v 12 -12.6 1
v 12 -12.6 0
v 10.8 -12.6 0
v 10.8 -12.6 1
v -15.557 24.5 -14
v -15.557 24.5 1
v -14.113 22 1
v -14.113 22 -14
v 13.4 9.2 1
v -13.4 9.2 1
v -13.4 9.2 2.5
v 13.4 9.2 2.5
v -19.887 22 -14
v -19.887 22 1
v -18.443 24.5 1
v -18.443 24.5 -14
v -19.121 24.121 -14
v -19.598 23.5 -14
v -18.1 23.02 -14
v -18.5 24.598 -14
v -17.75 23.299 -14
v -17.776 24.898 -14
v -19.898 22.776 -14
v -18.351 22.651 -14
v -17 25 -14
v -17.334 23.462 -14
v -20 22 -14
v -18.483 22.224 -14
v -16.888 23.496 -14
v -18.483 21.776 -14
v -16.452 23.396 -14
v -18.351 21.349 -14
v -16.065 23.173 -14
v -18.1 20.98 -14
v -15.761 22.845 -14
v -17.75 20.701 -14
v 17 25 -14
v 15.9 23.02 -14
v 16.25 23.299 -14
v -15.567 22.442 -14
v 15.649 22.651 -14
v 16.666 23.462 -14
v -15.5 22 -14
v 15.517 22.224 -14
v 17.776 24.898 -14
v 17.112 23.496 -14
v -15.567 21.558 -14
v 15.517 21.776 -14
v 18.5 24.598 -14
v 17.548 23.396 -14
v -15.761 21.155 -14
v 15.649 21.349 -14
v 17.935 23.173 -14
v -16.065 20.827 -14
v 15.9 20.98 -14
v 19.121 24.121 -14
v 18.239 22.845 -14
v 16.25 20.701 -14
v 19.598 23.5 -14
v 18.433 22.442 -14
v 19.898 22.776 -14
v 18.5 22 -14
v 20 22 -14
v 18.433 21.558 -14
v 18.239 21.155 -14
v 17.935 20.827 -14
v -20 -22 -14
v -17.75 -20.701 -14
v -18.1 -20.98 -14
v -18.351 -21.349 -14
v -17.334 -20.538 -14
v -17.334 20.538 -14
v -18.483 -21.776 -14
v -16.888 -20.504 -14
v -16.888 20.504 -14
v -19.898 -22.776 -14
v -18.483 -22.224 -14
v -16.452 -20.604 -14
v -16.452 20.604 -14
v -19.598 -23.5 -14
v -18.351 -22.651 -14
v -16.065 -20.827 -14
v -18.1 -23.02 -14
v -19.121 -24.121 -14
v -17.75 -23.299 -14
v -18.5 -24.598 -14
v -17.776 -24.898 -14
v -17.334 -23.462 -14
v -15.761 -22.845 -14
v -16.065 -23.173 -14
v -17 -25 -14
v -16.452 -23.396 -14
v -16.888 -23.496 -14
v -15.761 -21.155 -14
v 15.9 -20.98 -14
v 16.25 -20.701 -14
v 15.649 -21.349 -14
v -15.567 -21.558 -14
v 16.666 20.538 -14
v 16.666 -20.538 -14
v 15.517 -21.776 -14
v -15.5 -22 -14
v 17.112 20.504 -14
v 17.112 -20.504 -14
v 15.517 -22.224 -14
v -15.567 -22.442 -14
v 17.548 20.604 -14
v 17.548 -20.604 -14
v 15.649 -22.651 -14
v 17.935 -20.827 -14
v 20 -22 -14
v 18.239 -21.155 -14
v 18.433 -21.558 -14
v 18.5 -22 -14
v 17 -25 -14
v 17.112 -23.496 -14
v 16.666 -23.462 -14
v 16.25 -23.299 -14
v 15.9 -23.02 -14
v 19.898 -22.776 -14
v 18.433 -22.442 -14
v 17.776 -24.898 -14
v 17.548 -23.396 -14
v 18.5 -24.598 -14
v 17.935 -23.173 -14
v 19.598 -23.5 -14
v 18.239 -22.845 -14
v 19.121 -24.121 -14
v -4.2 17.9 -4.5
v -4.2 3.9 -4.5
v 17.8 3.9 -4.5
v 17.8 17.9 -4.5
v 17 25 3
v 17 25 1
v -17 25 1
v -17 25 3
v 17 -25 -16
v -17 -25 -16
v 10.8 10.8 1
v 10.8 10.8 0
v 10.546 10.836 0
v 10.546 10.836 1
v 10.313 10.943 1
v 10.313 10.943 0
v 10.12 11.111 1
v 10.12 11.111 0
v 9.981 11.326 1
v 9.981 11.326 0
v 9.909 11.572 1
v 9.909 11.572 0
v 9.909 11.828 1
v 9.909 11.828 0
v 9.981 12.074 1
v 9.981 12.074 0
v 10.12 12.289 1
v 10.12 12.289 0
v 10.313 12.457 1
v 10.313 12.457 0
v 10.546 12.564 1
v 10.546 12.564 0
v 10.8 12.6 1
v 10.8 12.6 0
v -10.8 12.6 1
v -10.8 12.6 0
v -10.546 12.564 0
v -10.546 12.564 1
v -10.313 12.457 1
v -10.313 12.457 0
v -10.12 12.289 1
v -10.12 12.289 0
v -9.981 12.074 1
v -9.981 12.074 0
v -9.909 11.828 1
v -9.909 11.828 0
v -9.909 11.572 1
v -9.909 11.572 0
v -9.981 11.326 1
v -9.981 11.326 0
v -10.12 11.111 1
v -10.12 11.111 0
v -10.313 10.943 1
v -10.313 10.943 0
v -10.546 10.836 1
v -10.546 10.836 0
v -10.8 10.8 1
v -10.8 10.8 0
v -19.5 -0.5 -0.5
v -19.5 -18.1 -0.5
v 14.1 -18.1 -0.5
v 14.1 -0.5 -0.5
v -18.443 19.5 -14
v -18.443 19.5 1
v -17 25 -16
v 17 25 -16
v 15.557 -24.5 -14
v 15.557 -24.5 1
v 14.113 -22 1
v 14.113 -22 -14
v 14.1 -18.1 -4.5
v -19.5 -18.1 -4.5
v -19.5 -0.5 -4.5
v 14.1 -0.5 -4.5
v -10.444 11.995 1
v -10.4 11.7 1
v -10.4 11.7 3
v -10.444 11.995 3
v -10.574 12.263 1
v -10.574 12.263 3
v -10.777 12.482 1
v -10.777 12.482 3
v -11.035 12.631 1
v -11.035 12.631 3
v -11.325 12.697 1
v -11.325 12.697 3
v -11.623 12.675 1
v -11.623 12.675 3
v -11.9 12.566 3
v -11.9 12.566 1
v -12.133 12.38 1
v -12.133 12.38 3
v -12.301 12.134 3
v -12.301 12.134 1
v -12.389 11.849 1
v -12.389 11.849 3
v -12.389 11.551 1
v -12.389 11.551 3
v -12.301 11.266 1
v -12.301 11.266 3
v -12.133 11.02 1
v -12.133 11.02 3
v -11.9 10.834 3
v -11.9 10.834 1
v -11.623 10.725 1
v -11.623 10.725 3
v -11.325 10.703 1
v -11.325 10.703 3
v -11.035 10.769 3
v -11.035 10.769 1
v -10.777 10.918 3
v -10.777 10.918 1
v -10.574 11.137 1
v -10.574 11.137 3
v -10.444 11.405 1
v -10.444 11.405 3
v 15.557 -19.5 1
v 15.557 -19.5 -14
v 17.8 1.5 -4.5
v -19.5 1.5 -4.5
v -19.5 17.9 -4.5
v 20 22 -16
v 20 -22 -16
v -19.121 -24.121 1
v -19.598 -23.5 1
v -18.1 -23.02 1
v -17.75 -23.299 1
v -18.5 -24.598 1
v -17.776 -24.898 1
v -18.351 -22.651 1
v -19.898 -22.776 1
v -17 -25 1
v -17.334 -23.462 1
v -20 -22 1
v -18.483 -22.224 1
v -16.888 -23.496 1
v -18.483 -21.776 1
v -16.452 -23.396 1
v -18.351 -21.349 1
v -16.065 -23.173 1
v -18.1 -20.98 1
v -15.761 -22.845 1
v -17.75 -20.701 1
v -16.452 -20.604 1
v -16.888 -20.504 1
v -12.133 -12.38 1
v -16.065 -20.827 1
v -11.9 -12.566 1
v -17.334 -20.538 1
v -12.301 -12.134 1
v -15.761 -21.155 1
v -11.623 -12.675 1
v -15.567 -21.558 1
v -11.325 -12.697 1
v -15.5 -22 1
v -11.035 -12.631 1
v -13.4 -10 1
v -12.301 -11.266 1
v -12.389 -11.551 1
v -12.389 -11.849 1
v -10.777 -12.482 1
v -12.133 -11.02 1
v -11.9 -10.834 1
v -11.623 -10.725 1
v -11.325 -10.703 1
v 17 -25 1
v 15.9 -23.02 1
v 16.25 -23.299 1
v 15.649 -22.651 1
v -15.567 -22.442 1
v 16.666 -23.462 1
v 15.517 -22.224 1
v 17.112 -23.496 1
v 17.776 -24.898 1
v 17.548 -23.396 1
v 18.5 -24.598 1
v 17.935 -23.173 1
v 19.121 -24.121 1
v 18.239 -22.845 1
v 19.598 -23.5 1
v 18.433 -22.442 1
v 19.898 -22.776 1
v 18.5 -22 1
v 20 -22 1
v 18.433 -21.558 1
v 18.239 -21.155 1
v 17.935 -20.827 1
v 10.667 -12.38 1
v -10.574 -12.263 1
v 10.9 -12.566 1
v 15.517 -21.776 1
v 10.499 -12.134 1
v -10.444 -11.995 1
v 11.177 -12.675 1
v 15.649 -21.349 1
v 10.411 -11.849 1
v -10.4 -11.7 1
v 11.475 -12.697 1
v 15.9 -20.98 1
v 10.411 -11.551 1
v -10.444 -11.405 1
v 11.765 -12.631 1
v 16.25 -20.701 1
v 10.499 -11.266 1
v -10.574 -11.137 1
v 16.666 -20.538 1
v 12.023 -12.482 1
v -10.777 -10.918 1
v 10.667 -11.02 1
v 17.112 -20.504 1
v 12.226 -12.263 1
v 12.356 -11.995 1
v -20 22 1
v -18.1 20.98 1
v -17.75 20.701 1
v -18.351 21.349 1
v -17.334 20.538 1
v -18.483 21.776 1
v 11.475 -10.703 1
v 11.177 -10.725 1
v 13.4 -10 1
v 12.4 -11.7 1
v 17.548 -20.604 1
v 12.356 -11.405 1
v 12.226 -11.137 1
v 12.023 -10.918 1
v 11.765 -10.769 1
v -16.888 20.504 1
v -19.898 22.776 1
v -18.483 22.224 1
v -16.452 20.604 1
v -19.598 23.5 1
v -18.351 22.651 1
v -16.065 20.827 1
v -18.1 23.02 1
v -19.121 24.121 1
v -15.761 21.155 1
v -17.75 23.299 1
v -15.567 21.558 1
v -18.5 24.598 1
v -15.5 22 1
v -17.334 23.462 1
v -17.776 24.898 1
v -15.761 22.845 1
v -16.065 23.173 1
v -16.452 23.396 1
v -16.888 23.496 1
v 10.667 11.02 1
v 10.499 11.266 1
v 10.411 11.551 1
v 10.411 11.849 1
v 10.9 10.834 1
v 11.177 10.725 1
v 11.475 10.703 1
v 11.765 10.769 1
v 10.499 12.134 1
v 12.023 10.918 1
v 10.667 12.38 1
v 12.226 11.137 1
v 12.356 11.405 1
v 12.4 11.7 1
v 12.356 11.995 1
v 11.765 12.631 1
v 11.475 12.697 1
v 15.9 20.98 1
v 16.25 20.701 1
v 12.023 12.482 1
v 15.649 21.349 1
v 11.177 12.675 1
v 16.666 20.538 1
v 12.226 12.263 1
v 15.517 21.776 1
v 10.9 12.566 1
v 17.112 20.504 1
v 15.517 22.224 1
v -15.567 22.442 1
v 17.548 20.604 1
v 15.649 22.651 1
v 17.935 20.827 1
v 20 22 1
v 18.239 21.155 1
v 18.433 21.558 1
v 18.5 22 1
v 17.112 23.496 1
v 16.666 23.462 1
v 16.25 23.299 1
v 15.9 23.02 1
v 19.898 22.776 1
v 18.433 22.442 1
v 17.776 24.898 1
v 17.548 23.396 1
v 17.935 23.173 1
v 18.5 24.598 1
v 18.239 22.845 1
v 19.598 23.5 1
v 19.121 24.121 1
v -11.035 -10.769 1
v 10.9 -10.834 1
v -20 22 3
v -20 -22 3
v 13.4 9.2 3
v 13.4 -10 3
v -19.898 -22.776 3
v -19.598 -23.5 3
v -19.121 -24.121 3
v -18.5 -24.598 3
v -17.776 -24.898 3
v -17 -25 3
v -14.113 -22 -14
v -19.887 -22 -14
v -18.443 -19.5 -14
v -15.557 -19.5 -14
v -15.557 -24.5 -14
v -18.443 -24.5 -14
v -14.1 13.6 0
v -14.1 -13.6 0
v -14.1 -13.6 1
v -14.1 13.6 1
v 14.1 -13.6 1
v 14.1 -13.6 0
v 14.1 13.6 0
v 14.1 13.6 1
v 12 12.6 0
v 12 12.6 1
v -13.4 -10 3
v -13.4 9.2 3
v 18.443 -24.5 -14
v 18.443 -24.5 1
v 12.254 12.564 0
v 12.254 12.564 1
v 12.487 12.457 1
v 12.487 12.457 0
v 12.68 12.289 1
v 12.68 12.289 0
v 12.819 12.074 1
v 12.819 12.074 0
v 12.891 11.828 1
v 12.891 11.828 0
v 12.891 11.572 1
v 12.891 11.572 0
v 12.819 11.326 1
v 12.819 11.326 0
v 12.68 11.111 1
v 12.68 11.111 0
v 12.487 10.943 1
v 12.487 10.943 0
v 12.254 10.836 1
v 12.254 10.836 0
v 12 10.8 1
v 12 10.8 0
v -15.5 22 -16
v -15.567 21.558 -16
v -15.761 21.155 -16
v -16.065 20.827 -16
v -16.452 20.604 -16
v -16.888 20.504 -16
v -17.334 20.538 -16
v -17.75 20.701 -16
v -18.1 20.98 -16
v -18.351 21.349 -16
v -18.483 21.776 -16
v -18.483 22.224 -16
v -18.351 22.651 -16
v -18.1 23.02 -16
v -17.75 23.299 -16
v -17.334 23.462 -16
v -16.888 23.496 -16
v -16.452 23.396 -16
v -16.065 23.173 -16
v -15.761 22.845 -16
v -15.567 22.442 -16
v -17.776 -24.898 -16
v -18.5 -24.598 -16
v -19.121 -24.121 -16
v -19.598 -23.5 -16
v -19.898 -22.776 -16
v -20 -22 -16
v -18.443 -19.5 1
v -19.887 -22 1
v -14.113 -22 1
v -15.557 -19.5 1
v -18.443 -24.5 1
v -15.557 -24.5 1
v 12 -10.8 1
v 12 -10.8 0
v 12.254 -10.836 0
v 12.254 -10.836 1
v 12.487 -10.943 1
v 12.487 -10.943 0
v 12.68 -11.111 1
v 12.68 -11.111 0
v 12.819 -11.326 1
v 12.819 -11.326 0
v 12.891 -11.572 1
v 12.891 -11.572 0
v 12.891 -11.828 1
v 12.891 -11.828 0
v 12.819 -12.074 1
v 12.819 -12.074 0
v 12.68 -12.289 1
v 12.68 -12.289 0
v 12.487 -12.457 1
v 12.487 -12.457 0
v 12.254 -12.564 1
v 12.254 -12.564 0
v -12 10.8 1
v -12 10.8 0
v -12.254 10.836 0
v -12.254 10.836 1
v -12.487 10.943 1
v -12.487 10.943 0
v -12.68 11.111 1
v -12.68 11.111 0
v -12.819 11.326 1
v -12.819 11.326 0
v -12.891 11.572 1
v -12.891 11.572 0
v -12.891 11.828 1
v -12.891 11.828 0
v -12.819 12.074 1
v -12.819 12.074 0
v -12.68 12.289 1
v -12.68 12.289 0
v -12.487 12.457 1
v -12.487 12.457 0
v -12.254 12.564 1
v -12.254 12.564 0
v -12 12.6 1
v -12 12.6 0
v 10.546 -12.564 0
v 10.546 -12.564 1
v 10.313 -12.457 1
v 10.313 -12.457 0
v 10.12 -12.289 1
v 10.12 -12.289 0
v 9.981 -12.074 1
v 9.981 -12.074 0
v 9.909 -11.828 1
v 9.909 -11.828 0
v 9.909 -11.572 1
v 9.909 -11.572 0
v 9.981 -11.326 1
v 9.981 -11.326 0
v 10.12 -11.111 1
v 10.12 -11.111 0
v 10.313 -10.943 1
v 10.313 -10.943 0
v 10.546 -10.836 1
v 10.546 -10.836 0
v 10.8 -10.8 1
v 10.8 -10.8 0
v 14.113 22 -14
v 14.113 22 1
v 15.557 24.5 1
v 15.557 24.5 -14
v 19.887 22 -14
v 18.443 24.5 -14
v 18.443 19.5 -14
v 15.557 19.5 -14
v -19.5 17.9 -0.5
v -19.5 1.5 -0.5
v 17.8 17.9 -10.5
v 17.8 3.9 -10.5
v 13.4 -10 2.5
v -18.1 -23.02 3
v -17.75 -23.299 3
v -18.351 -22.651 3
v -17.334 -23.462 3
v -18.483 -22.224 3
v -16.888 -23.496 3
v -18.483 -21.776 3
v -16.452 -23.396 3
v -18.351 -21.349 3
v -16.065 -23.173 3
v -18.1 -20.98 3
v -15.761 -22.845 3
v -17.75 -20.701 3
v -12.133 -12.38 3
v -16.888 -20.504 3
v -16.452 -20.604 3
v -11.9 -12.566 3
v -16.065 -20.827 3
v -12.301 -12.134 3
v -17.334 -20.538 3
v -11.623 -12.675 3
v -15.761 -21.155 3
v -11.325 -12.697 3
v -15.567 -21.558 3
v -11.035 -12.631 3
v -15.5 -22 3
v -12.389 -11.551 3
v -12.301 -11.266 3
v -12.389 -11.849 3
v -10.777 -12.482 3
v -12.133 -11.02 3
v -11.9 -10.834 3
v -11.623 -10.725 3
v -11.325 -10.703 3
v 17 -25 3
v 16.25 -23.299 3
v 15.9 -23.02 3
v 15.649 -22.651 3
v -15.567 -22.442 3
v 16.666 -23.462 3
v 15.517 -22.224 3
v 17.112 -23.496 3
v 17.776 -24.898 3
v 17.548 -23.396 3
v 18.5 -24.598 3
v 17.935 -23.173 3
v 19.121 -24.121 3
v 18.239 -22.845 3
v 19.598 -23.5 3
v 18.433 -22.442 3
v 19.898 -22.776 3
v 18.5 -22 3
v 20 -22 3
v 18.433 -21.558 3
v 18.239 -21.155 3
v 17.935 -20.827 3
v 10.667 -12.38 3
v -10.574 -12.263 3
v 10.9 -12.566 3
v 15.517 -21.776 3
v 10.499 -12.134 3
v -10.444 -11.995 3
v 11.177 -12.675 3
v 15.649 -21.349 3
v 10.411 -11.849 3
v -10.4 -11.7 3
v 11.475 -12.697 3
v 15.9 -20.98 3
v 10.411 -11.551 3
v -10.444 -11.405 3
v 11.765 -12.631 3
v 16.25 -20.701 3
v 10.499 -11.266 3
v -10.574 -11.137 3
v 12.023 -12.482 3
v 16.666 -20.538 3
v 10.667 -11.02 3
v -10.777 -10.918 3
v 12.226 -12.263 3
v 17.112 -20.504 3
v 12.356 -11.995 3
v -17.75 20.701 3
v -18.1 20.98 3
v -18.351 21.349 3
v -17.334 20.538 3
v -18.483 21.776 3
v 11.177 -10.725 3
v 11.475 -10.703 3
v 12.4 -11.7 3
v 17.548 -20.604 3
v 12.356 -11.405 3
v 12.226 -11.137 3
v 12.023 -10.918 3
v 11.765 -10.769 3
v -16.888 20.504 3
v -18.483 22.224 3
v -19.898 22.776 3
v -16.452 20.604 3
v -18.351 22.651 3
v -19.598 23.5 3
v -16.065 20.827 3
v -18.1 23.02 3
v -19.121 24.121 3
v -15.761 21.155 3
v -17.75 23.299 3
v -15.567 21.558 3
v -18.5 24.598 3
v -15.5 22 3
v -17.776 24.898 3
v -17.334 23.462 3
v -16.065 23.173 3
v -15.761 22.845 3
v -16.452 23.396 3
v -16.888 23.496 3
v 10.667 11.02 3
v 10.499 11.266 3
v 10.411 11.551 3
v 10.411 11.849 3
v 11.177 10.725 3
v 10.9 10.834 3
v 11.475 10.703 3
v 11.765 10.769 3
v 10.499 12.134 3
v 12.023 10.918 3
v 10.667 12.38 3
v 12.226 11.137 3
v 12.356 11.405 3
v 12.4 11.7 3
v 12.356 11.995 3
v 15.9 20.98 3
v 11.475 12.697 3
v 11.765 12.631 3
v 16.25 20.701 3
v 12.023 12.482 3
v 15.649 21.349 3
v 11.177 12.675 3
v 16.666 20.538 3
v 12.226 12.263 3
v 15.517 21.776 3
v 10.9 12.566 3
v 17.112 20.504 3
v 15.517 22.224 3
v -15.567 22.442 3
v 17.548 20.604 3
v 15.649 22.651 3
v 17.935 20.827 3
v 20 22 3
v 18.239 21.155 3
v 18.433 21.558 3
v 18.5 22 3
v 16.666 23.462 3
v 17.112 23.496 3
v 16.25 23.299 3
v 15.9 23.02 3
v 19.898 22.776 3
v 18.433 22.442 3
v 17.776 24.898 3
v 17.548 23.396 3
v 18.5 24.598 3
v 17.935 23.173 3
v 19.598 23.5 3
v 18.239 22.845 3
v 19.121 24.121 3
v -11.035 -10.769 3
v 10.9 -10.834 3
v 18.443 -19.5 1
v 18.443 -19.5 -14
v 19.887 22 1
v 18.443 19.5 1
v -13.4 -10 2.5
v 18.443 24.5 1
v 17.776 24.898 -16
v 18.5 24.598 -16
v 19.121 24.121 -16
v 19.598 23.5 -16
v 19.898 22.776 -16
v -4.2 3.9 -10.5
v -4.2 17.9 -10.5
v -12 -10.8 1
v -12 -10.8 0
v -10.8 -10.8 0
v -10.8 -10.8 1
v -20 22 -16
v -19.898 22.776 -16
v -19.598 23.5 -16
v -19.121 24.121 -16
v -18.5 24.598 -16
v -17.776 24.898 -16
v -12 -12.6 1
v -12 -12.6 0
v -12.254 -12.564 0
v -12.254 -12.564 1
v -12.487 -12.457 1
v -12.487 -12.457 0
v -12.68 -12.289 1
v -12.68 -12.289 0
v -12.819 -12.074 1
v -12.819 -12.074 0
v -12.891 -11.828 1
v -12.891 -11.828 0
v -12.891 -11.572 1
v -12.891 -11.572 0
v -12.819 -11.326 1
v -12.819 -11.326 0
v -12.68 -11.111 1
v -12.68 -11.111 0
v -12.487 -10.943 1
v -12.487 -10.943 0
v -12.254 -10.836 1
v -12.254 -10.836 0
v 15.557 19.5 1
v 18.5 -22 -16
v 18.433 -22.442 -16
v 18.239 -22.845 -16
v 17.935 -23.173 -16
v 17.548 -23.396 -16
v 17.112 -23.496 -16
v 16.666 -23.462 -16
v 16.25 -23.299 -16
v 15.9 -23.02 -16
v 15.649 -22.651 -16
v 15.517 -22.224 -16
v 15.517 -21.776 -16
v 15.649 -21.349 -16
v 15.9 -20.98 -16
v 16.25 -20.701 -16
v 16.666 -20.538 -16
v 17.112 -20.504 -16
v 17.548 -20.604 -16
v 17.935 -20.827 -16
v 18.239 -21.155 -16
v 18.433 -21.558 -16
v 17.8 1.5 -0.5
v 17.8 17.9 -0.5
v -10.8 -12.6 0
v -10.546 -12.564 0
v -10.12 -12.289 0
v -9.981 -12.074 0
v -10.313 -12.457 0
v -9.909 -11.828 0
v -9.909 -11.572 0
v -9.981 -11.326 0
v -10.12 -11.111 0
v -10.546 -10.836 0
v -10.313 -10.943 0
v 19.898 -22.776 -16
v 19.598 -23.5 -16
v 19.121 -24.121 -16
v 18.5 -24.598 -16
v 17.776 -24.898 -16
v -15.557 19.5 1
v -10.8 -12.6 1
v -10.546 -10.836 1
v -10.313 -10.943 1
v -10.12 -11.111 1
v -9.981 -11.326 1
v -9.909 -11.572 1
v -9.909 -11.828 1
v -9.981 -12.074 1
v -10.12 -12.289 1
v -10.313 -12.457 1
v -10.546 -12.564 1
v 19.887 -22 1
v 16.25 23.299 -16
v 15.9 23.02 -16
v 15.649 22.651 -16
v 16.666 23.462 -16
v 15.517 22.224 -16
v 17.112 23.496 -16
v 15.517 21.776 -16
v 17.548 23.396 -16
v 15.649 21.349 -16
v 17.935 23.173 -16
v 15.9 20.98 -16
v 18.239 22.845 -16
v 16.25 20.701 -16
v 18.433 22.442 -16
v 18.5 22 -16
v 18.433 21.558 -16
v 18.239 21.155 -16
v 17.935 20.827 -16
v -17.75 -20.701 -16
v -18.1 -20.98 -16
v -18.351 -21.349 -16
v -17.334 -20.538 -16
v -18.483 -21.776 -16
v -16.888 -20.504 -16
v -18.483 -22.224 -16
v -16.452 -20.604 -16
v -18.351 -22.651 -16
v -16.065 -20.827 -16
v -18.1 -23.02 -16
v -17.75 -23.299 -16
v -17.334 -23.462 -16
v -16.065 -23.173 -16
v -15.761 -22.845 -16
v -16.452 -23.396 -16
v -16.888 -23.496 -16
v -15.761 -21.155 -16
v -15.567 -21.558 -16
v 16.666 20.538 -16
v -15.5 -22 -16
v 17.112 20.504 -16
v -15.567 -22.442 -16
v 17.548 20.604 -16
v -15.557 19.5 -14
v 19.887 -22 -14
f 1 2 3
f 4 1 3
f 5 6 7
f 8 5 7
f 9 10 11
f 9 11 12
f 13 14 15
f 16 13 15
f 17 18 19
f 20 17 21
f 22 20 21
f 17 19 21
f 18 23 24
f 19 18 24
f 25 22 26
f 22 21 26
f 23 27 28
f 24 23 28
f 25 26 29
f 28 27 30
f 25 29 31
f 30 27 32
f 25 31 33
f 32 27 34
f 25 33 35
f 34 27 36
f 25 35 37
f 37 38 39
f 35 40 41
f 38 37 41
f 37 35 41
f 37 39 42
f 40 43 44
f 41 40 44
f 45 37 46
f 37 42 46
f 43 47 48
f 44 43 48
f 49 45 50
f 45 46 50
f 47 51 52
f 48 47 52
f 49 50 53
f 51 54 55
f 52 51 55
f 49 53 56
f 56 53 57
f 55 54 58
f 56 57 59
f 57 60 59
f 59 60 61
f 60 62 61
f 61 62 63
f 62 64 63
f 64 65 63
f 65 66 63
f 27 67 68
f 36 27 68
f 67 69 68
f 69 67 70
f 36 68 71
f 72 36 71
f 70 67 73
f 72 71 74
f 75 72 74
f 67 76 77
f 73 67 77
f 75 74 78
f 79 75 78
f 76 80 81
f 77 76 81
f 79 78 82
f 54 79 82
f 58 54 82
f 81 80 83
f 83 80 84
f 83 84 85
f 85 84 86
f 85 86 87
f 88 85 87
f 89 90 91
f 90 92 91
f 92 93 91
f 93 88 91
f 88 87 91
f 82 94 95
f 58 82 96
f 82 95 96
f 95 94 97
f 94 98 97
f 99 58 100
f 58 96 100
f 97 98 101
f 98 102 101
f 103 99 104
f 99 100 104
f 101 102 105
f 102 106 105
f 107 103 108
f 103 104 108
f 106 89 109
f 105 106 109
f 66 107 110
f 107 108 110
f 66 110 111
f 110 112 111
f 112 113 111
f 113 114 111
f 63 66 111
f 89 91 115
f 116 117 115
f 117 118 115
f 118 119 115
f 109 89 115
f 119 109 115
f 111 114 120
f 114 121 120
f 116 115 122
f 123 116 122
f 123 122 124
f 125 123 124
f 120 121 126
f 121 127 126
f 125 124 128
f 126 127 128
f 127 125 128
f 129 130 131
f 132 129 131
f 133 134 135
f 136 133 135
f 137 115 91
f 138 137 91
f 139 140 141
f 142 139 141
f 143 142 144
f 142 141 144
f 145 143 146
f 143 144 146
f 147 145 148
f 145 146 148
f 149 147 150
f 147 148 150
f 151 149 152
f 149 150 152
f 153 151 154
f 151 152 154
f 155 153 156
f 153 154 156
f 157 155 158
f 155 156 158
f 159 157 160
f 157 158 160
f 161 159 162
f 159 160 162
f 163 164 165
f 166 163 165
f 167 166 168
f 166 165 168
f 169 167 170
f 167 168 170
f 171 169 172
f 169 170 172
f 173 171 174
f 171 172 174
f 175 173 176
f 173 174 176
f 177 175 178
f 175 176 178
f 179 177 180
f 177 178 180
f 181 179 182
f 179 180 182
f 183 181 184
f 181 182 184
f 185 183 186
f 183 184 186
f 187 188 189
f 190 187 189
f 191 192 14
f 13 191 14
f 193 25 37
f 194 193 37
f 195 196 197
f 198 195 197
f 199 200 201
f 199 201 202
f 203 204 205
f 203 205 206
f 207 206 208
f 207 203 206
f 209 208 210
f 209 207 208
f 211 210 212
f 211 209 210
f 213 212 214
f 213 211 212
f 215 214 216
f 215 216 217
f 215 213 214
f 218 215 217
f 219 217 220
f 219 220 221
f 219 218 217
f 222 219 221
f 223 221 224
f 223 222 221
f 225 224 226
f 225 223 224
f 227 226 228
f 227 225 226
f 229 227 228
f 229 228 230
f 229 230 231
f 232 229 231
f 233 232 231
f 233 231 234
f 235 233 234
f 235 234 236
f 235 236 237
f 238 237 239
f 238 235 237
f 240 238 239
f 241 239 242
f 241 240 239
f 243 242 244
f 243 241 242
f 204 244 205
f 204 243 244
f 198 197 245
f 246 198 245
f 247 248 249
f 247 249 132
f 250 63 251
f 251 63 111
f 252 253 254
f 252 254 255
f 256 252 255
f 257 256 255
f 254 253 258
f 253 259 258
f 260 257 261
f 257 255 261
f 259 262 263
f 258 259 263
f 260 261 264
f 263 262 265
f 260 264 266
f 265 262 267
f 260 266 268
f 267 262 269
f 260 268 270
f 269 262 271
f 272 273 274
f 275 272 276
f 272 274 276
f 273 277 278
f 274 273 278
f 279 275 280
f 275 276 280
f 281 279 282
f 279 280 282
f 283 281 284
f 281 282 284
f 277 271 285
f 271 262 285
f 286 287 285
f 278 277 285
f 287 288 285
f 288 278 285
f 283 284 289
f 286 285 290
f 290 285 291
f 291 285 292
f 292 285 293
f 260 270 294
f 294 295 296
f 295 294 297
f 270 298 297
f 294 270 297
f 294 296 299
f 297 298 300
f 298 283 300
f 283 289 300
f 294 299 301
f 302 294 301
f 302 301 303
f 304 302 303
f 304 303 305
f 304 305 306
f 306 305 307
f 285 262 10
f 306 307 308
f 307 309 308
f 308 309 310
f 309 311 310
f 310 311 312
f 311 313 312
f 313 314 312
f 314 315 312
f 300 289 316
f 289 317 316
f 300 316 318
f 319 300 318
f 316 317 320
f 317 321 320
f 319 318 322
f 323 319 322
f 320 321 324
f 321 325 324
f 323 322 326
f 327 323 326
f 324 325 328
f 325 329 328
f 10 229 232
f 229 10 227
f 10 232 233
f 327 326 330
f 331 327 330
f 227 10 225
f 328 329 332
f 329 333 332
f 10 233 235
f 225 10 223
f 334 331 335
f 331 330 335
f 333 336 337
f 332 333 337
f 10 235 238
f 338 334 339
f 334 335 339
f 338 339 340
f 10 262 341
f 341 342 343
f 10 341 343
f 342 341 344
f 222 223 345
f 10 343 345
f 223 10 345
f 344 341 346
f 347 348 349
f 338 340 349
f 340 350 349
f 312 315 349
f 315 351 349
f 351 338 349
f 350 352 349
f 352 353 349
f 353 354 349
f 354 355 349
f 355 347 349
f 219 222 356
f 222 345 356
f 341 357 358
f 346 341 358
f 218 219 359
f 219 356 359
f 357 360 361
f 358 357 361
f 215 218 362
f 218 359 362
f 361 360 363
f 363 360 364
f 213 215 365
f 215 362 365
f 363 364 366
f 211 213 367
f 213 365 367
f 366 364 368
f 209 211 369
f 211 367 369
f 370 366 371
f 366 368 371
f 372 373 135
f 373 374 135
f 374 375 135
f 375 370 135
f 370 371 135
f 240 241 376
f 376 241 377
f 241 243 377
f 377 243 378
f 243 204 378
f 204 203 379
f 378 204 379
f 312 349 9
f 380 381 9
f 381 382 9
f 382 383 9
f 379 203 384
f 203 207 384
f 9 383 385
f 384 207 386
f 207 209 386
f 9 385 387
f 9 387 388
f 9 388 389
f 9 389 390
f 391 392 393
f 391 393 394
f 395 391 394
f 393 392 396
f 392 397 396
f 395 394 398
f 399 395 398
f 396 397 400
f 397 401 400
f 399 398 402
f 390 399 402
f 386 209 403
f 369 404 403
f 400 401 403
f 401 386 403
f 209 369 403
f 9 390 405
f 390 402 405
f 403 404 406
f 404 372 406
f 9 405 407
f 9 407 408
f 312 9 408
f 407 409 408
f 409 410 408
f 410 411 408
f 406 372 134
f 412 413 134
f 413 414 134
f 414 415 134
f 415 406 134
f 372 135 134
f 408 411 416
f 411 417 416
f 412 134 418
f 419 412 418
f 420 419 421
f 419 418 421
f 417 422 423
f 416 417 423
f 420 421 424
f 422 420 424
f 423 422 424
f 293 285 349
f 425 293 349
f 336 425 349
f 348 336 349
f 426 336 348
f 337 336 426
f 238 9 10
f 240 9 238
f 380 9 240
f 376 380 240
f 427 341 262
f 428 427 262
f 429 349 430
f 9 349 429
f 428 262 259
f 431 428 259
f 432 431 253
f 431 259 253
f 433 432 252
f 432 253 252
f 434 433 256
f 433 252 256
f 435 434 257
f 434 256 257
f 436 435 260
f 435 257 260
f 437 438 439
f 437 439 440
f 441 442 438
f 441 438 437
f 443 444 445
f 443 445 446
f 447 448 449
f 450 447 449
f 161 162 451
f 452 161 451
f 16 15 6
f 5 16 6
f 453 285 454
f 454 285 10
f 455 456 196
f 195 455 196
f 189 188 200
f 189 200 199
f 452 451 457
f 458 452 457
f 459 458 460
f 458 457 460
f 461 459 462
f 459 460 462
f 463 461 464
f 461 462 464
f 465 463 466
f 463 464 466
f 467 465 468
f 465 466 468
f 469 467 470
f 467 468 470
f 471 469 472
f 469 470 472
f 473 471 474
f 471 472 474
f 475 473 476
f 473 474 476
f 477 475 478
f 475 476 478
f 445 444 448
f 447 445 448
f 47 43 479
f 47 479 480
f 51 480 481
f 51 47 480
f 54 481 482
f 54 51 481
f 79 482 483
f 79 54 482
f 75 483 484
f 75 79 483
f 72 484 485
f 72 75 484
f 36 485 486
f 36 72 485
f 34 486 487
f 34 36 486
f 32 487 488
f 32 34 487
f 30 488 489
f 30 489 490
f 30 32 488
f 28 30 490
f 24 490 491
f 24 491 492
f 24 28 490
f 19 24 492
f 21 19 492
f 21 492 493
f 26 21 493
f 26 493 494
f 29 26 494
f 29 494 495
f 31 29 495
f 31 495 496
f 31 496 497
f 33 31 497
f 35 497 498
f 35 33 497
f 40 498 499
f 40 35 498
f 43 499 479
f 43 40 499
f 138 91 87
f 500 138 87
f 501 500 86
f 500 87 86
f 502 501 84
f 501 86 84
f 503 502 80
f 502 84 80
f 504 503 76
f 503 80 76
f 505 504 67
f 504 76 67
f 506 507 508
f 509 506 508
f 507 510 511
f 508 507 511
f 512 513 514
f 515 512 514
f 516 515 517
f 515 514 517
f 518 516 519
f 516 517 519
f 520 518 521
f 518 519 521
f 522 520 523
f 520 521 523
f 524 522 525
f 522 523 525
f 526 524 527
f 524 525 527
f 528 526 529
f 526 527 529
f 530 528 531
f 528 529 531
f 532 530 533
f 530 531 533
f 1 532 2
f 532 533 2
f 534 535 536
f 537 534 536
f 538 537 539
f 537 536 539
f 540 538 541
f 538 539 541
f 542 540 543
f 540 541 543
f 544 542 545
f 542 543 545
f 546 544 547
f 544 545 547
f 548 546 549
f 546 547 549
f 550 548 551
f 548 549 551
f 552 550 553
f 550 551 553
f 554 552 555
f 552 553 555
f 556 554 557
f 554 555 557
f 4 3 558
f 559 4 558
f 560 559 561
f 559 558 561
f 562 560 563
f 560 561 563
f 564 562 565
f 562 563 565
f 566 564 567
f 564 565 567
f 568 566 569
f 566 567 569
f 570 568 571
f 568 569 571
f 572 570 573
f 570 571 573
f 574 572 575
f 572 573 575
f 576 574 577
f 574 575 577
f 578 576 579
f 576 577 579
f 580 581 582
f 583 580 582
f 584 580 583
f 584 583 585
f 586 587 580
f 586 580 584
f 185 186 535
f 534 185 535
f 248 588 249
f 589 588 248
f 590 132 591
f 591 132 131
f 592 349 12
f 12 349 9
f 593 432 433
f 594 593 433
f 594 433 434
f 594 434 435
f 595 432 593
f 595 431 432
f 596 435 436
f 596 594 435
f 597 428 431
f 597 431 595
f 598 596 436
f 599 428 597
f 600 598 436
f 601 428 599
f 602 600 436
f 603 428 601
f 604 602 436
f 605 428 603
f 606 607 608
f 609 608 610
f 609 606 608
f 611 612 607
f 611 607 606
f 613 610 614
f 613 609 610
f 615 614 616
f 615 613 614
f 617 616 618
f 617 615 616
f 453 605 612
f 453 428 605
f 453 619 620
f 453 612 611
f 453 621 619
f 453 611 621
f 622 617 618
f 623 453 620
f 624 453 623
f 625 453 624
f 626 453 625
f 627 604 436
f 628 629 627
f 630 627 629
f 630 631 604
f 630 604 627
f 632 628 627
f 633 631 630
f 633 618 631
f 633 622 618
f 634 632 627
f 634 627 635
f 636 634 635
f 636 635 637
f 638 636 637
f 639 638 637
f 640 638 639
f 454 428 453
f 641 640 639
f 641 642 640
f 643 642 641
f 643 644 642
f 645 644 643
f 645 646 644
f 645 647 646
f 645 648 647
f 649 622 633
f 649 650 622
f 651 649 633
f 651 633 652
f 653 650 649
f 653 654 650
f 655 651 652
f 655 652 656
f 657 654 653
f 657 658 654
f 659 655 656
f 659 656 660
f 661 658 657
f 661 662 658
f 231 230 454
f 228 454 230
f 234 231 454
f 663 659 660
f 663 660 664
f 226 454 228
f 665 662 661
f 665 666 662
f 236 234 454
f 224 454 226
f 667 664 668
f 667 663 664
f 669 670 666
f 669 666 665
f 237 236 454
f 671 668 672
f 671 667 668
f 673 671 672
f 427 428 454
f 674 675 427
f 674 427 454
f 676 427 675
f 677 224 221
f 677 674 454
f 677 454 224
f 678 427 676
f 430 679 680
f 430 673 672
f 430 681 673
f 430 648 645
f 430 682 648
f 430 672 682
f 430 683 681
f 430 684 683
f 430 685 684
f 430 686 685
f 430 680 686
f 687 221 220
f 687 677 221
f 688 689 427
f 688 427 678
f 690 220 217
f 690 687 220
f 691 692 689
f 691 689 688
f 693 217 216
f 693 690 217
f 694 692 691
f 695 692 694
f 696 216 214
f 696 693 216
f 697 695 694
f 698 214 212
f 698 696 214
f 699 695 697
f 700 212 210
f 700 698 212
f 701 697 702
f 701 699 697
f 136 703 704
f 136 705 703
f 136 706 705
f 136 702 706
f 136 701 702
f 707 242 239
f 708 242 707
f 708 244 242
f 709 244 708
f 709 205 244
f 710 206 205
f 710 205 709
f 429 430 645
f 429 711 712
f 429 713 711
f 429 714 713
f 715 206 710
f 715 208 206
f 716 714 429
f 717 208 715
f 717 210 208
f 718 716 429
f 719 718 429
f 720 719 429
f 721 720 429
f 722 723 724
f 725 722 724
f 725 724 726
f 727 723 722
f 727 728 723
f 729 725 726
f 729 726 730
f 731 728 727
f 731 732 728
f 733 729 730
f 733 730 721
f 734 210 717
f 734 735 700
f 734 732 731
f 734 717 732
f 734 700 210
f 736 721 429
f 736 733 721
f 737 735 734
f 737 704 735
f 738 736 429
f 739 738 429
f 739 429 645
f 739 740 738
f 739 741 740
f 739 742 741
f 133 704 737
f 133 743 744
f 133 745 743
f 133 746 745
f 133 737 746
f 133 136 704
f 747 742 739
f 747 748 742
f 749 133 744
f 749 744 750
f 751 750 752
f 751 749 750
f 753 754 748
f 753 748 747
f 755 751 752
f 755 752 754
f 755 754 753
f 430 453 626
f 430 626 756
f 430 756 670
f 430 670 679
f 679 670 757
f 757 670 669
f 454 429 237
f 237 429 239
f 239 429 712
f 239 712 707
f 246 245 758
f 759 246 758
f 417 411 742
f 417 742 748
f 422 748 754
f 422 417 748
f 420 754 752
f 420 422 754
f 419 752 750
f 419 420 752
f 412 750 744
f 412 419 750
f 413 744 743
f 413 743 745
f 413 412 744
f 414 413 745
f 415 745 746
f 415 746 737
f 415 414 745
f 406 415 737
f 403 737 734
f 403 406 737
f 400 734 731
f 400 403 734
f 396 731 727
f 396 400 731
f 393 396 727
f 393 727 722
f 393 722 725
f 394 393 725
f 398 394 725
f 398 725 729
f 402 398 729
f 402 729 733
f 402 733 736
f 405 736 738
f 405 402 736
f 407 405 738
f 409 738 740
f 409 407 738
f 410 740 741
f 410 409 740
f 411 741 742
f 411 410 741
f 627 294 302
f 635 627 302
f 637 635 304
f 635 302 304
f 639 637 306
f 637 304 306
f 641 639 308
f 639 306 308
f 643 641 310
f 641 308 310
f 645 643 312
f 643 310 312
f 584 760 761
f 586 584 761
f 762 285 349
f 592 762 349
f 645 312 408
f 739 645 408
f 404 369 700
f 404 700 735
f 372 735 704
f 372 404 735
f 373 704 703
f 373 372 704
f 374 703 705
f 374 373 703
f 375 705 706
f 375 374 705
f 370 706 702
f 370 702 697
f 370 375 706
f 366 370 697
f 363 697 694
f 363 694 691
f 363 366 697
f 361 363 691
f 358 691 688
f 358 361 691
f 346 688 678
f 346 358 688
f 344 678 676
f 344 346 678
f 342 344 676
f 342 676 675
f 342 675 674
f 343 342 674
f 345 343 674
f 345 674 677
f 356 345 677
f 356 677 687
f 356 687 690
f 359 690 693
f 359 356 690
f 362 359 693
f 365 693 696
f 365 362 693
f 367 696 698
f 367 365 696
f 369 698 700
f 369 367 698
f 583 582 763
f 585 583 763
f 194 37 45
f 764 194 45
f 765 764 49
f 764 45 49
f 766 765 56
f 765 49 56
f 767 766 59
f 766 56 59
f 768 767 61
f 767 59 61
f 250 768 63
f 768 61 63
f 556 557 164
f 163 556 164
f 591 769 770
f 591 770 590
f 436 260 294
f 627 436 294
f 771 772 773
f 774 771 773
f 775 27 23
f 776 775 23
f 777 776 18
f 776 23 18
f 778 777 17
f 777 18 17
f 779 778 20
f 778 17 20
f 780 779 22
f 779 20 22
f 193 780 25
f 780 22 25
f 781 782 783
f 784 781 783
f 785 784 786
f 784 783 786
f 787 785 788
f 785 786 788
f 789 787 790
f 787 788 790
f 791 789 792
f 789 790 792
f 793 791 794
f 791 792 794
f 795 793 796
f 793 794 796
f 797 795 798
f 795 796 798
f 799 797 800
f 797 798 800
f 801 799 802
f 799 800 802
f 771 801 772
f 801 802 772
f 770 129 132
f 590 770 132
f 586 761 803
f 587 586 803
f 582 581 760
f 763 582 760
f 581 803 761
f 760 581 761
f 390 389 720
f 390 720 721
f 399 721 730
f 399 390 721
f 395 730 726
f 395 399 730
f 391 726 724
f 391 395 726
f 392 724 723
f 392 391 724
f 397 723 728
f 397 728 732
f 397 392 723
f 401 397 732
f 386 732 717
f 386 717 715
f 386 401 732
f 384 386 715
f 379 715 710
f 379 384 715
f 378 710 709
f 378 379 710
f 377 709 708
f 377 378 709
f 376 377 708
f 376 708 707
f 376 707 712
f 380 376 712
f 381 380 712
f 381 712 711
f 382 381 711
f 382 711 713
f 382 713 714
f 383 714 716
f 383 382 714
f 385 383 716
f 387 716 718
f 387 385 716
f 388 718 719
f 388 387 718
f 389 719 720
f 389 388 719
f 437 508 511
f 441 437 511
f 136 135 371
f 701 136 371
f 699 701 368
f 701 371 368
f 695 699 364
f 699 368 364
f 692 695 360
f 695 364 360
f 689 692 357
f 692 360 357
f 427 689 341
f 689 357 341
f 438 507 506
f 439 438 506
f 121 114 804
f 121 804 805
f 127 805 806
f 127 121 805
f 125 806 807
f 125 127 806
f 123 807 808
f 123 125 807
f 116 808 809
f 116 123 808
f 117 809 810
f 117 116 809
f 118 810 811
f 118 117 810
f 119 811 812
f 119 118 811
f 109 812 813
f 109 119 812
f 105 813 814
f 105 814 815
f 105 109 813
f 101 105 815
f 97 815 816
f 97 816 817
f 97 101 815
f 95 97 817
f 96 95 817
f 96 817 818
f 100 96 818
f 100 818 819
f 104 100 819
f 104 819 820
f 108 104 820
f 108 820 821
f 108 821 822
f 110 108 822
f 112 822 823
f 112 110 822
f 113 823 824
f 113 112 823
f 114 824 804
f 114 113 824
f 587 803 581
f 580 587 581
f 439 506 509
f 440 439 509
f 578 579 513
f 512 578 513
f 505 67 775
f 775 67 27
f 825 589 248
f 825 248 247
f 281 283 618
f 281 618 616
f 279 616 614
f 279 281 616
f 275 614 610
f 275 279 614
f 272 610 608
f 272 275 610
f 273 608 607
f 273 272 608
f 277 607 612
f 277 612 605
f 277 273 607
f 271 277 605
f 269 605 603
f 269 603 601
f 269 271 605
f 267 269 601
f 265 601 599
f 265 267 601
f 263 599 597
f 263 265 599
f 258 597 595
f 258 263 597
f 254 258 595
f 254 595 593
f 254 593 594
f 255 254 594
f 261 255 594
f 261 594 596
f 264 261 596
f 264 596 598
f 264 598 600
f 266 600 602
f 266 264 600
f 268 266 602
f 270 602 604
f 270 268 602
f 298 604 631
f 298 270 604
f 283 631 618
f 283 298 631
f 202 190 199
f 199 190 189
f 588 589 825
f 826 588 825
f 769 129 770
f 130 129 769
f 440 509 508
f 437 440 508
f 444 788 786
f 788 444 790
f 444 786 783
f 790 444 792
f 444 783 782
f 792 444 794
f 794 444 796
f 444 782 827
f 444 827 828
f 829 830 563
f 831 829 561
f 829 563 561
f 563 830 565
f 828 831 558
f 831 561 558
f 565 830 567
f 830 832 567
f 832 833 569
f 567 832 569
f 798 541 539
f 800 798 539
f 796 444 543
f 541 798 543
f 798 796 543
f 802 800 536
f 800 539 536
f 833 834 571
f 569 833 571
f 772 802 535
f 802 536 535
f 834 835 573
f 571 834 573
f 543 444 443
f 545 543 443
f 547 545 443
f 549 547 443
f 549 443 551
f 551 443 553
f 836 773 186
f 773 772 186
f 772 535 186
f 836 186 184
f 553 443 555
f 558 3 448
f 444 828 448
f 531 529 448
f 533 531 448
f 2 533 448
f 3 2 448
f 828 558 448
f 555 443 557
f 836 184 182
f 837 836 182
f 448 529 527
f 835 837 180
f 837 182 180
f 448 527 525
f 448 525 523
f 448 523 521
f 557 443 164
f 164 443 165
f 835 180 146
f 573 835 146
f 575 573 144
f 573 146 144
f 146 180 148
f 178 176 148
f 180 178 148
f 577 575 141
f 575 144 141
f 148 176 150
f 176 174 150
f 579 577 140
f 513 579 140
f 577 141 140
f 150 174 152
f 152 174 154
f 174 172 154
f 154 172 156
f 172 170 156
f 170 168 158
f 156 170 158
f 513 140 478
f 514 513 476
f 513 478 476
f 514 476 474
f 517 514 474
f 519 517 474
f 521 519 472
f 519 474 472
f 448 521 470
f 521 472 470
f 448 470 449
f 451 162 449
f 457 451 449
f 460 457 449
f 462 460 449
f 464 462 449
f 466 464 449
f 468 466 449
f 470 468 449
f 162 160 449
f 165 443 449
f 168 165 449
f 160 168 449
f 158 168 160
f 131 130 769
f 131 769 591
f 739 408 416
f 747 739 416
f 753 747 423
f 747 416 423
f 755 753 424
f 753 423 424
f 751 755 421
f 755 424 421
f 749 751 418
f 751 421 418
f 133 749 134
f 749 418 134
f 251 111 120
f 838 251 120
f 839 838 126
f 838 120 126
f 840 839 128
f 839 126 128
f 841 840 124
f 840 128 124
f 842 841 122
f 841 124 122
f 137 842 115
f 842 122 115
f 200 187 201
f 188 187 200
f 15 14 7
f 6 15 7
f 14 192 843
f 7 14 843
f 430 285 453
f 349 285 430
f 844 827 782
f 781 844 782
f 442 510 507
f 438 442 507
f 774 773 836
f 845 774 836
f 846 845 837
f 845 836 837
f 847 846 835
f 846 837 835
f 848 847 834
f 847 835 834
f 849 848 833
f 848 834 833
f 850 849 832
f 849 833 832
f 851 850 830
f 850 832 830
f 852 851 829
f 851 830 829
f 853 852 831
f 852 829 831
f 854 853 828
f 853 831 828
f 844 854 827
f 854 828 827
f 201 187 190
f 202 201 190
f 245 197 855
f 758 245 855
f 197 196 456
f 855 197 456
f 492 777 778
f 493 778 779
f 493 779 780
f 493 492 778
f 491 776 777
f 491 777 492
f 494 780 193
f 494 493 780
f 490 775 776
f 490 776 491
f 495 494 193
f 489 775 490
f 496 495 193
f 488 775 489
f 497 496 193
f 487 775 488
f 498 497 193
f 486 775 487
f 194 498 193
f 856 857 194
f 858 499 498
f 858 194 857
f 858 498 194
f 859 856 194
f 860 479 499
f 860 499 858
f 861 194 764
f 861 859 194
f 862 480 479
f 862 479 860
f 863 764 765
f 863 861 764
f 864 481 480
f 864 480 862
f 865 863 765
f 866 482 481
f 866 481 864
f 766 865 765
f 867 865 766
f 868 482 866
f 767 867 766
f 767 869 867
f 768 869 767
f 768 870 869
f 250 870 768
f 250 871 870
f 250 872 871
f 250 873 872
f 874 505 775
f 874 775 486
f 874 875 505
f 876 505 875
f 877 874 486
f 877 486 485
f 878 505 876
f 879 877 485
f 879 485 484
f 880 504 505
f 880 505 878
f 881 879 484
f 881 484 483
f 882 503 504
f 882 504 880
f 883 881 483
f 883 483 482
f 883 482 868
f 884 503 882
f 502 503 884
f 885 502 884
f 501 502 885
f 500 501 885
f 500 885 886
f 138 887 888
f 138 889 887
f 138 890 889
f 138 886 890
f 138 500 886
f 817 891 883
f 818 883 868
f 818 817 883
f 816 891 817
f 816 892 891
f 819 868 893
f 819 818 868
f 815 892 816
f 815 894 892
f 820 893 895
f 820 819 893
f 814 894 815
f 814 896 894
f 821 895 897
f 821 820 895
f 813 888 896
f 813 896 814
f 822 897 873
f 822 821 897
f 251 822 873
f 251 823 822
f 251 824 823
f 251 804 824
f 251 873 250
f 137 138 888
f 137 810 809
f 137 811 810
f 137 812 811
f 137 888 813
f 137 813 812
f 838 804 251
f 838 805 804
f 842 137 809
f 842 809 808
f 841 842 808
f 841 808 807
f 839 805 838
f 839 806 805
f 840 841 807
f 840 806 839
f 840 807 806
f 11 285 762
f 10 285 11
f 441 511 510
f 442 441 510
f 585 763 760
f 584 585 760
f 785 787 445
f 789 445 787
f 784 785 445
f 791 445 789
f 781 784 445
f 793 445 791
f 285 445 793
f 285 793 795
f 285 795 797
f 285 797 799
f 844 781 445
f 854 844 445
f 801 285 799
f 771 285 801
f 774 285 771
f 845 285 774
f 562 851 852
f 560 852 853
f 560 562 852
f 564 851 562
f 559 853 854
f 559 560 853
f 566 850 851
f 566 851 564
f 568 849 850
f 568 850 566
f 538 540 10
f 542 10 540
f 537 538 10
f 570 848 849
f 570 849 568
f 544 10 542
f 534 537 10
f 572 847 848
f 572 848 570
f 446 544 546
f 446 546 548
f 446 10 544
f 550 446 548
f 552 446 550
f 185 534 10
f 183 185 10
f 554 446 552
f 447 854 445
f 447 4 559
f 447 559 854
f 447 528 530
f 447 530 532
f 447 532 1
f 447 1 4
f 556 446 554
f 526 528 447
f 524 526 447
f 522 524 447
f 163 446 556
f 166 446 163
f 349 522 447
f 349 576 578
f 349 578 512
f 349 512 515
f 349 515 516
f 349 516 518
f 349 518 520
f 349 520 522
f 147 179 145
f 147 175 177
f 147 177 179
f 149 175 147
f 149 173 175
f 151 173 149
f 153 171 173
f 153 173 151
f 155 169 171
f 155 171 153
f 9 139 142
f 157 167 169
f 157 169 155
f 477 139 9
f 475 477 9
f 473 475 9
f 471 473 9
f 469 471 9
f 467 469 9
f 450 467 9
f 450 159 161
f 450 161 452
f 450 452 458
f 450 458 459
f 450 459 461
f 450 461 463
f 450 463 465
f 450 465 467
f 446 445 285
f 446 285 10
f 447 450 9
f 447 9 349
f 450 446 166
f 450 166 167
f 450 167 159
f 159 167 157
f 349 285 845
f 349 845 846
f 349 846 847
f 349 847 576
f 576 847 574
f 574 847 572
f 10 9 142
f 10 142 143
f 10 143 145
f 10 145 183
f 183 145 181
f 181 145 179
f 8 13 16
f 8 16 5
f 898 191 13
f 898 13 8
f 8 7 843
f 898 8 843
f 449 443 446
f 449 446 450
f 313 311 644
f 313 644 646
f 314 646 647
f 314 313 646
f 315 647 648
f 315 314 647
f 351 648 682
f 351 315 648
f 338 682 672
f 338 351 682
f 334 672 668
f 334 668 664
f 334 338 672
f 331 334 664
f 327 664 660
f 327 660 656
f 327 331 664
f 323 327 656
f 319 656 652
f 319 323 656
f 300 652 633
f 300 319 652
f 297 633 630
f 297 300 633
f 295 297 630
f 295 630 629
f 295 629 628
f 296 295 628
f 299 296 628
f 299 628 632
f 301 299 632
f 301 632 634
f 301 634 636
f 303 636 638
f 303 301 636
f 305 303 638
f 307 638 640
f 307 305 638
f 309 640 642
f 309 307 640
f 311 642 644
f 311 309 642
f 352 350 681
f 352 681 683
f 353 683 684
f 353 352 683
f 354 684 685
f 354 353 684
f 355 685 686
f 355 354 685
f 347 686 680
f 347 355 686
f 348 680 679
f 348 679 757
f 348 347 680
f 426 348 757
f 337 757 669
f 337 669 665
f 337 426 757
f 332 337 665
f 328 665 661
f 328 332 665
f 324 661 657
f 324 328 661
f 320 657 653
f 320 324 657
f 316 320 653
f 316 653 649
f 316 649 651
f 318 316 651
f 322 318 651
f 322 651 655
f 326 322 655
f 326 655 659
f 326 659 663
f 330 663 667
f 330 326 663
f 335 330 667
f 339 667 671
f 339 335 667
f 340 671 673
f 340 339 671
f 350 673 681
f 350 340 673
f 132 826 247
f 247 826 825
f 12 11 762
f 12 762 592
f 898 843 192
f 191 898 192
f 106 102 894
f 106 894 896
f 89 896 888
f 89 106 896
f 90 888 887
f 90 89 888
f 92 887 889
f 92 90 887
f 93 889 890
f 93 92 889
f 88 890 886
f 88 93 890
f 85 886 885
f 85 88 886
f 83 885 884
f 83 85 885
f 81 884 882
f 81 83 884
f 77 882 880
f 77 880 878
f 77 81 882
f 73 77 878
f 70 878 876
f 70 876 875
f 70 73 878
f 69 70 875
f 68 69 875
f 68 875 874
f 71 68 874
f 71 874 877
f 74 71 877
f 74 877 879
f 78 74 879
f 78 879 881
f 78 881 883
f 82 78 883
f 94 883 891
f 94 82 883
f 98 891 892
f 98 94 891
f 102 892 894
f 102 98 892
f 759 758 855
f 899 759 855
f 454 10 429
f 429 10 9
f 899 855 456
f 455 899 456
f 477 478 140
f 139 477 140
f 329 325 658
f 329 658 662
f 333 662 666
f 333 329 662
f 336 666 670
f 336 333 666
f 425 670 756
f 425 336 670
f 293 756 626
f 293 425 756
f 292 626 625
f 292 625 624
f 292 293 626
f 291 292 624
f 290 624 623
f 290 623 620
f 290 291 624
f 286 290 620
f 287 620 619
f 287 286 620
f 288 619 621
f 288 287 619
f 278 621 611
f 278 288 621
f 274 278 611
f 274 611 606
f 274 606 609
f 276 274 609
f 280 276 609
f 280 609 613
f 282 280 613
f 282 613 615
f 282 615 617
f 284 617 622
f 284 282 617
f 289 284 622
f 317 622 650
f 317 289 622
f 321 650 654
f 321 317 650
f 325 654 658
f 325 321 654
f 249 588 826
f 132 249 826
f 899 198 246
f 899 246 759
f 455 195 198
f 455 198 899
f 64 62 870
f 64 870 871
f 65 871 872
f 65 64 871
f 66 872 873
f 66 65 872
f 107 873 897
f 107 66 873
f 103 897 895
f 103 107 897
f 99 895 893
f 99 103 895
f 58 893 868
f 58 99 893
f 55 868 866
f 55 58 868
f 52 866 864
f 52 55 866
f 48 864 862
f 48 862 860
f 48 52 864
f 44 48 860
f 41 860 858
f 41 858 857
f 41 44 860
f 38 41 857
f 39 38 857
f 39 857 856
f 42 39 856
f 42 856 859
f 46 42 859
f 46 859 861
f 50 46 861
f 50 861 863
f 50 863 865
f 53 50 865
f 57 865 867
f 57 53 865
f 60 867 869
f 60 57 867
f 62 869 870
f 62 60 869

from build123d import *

# Parameters (mm, degrees)
F0_W      = 28.2
F0_H      = 27.2
F1_DEPTH  = 1
F2_W      = 26.8
F2_H      = 19.2
F3_DEPTH  = 1.5
F4_R      = 1.5
F4_R_2    = 1
F4_W      = 26.8
F4_H      = 19.2
F5_DEPTH  = 2
F7_W      = 33.6
F7_H      = 17.6
F7_W_2    = 37.3
F7_H_2    = 16.4
F8_DEPTH  = 4
F9_W      = 22
F9_H      = 14
F10_DEPTH = 6
F12_DEPTH = 15
F13_R     = 1.5
F14_DEPTH = 2


with BuildPart() as f1:
    # F0 (on Top) → F1 (new body)
    with BuildSketch(Plane.XY):
        Rectangle(F0_W, F0_H)
        with BuildLine():
            Line((-10.8, -12.6), (-12, -12.6))
            ThreePointArc((-12, -12.6), (-12.9, -11.7), (-12, -10.8))
            Line((-12, -10.8), (-10.8, -10.8))
            ThreePointArc((-10.8, -10.8), (-9.9, -11.7), (-10.8, -12.6))
        make_face(mode=Mode.SUBTRACT)
        with BuildLine():
            Line((10.8, -10.8), (12, -10.8))
            ThreePointArc((12, -10.8), (12.9, -11.7), (12, -12.6))
            Line((12, -12.6), (10.8, -12.6))
            ThreePointArc((10.8, -12.6), (9.9, -11.7), (10.8, -10.8))
        make_face(mode=Mode.SUBTRACT)
        with BuildLine():
            ThreePointArc((-12, 10.8), (-12.9, 11.7), (-12, 12.6))
            Line((-12, 12.6), (-10.8, 12.6))
            ThreePointArc((-10.8, 12.6), (-9.9, 11.7), (-10.8, 10.8))
            Line((-10.8, 10.8), (-12, 10.8))
        make_face(mode=Mode.SUBTRACT)
        with BuildLine():
            ThreePointArc((12, 12.6), (12.9, 11.7), (12, 10.8))
            Line((12, 10.8), (10.8, 10.8))
            ThreePointArc((10.8, 10.8), (9.9, 11.7), (10.8, 12.6))
            Line((10.8, 12.6), (12, 12.6))
        make_face(mode=Mode.SUBTRACT)
    extrude(amount=F1_DEPTH)

    # F2 (on face) → F3 (join)
    with BuildSketch(Plane.XY.offset(1)):
        with Locations((0, -0.4)):
            Rectangle(F2_W, F2_H)
    extrude(amount=F3_DEPTH)


with BuildPart() as f5:
    # F4 (on face) → F5 (new body)
    with BuildSketch(Plane.XY.offset(1)):
        with BuildLine():
            ThreePointArc((20, 22), (19.12132, 24.12132), (17, 25))
            Line((17, 25), (-17, 25))
            ThreePointArc((-17, 25), (-19.12132, 24.12132), (-20, 22))
            Line((-20, 22), (-20, -22))
            ThreePointArc((-20, -22), (-19.12132, -24.12132), (-17, -25))
            Line((-17, -25), (17, -25))
            ThreePointArc((17, -25), (19.12132, -24.12132), (20, -22))
            Line((20, -22), (20, 22))
        make_face()
        with Locations((-17, -22)):
            Circle(F4_R, mode=Mode.SUBTRACT)
        with Locations((-11.4, -11.7)):
            Circle(F4_R_2, mode=Mode.SUBTRACT)
        with Locations((17, -22)):
            Circle(F4_R, mode=Mode.SUBTRACT)
        with Locations((0, -0.4)):
            Rectangle(F4_W, F4_H, mode=Mode.SUBTRACT)
        with Locations((11.4, -11.7)):
            Circle(F4_R_2, mode=Mode.SUBTRACT)
        with Locations((-11.4, 11.7)):
            Circle(F4_R_2, mode=Mode.SUBTRACT)
        with Locations((-17, 22)):
            Circle(F4_R, mode=Mode.SUBTRACT)
        with Locations((11.4, 11.7)):
            Circle(F4_R_2, mode=Mode.SUBTRACT)
        with Locations((17, 22)):
            Circle(F4_R, mode=Mode.SUBTRACT)
    extrude(amount=F5_DEPTH)


with BuildPart() as f8:
    # F7 (on offset) → F8 (new body)
    with BuildSketch(Plane(origin=(0, 0, -0.5), x_dir=(1, 0, 0), z_dir=(0, 0, -1))):
        with Locations((-2.7, 9.3)):
            Rectangle(F7_W, F7_H)
        with Locations((-0.85, -9.7)):
            Rectangle(F7_W_2, F7_H_2)
    extrude(amount=F8_DEPTH)


with BuildPart() as f10:
    # F9 (on face) → F10 (new body)
    with BuildSketch(Plane(origin=(0, 0, -4.5), x_dir=(1, 0, 0), z_dir=(0, 0, -1))):
        with Locations((6.8, -10.9)):
            Rectangle(F9_W, F9_H)
    extrude(amount=F10_DEPTH)


with BuildPart() as f12:
    # F11 (on face) → F12 (new body)
    with BuildSketch(Plane(origin=(0, 0, 1), x_dir=(1, 0, 0), z_dir=(0, 0, -1))):
        Polygon((-15.556624, 24.5), (-18.443376, 24.5), (-19.886751, 22), (-18.443376, 19.5), (-15.556624, 19.5), (-14.113249, 22), align=None)
        Polygon((18.443376, 19.5), (19.886751, 22), (18.443376, 24.5), (15.556624, 24.5), (14.113249, 22), (15.556624, 19.5), align=None)
        Polygon((-19.886751, -22), (-18.443376, -24.5), (-15.556624, -24.5), (-14.113249, -22), (-15.556624, -19.5), (-18.443376, -19.5), align=None)
        Polygon((15.556624, -19.5), (14.113249, -22), (15.556624, -24.5), (18.443376, -24.5), (19.886751, -22), (18.443376, -19.5), align=None)
    extrude(amount=F12_DEPTH)


with BuildPart() as f14:
    # F13 (on face) → F14 (new body)
    with BuildSketch(Plane(origin=(0, 0, -14), x_dir=(1, 0, 0), z_dir=(0, 0, -1))):
        with BuildLine():
            ThreePointArc((20, 22), (19.12132, 24.12132), (17, 25))
            Line((17, 25), (-17, 25))
            ThreePointArc((-17, 25), (-19.12132, 24.12132), (-20, 22))
            Line((-20, 22), (-20, -22))
            ThreePointArc((-20, -22), (-19.12132, -24.12132), (-17, -25))
            Line((-17, -25), (17, -25))
            ThreePointArc((17, -25), (19.12132, -24.12132), (20, -22))
            Line((20, -22), (20, 22))
        make_face()
        with Locations((-17, -22)):
            Circle(F13_R, mode=Mode.SUBTRACT)
        with Locations((17, -22)):
            Circle(F13_R, mode=Mode.SUBTRACT)
        with Locations((-17, 22)):
            Circle(F13_R, mode=Mode.SUBTRACT)
        with Locations((17, 22)):
            Circle(F13_R, mode=Mode.SUBTRACT)
    extrude(amount=F14_DEPTH)


solid = Compound([f1.part, f5.part, f8.part, f10.part, f12.part, f14.part])
